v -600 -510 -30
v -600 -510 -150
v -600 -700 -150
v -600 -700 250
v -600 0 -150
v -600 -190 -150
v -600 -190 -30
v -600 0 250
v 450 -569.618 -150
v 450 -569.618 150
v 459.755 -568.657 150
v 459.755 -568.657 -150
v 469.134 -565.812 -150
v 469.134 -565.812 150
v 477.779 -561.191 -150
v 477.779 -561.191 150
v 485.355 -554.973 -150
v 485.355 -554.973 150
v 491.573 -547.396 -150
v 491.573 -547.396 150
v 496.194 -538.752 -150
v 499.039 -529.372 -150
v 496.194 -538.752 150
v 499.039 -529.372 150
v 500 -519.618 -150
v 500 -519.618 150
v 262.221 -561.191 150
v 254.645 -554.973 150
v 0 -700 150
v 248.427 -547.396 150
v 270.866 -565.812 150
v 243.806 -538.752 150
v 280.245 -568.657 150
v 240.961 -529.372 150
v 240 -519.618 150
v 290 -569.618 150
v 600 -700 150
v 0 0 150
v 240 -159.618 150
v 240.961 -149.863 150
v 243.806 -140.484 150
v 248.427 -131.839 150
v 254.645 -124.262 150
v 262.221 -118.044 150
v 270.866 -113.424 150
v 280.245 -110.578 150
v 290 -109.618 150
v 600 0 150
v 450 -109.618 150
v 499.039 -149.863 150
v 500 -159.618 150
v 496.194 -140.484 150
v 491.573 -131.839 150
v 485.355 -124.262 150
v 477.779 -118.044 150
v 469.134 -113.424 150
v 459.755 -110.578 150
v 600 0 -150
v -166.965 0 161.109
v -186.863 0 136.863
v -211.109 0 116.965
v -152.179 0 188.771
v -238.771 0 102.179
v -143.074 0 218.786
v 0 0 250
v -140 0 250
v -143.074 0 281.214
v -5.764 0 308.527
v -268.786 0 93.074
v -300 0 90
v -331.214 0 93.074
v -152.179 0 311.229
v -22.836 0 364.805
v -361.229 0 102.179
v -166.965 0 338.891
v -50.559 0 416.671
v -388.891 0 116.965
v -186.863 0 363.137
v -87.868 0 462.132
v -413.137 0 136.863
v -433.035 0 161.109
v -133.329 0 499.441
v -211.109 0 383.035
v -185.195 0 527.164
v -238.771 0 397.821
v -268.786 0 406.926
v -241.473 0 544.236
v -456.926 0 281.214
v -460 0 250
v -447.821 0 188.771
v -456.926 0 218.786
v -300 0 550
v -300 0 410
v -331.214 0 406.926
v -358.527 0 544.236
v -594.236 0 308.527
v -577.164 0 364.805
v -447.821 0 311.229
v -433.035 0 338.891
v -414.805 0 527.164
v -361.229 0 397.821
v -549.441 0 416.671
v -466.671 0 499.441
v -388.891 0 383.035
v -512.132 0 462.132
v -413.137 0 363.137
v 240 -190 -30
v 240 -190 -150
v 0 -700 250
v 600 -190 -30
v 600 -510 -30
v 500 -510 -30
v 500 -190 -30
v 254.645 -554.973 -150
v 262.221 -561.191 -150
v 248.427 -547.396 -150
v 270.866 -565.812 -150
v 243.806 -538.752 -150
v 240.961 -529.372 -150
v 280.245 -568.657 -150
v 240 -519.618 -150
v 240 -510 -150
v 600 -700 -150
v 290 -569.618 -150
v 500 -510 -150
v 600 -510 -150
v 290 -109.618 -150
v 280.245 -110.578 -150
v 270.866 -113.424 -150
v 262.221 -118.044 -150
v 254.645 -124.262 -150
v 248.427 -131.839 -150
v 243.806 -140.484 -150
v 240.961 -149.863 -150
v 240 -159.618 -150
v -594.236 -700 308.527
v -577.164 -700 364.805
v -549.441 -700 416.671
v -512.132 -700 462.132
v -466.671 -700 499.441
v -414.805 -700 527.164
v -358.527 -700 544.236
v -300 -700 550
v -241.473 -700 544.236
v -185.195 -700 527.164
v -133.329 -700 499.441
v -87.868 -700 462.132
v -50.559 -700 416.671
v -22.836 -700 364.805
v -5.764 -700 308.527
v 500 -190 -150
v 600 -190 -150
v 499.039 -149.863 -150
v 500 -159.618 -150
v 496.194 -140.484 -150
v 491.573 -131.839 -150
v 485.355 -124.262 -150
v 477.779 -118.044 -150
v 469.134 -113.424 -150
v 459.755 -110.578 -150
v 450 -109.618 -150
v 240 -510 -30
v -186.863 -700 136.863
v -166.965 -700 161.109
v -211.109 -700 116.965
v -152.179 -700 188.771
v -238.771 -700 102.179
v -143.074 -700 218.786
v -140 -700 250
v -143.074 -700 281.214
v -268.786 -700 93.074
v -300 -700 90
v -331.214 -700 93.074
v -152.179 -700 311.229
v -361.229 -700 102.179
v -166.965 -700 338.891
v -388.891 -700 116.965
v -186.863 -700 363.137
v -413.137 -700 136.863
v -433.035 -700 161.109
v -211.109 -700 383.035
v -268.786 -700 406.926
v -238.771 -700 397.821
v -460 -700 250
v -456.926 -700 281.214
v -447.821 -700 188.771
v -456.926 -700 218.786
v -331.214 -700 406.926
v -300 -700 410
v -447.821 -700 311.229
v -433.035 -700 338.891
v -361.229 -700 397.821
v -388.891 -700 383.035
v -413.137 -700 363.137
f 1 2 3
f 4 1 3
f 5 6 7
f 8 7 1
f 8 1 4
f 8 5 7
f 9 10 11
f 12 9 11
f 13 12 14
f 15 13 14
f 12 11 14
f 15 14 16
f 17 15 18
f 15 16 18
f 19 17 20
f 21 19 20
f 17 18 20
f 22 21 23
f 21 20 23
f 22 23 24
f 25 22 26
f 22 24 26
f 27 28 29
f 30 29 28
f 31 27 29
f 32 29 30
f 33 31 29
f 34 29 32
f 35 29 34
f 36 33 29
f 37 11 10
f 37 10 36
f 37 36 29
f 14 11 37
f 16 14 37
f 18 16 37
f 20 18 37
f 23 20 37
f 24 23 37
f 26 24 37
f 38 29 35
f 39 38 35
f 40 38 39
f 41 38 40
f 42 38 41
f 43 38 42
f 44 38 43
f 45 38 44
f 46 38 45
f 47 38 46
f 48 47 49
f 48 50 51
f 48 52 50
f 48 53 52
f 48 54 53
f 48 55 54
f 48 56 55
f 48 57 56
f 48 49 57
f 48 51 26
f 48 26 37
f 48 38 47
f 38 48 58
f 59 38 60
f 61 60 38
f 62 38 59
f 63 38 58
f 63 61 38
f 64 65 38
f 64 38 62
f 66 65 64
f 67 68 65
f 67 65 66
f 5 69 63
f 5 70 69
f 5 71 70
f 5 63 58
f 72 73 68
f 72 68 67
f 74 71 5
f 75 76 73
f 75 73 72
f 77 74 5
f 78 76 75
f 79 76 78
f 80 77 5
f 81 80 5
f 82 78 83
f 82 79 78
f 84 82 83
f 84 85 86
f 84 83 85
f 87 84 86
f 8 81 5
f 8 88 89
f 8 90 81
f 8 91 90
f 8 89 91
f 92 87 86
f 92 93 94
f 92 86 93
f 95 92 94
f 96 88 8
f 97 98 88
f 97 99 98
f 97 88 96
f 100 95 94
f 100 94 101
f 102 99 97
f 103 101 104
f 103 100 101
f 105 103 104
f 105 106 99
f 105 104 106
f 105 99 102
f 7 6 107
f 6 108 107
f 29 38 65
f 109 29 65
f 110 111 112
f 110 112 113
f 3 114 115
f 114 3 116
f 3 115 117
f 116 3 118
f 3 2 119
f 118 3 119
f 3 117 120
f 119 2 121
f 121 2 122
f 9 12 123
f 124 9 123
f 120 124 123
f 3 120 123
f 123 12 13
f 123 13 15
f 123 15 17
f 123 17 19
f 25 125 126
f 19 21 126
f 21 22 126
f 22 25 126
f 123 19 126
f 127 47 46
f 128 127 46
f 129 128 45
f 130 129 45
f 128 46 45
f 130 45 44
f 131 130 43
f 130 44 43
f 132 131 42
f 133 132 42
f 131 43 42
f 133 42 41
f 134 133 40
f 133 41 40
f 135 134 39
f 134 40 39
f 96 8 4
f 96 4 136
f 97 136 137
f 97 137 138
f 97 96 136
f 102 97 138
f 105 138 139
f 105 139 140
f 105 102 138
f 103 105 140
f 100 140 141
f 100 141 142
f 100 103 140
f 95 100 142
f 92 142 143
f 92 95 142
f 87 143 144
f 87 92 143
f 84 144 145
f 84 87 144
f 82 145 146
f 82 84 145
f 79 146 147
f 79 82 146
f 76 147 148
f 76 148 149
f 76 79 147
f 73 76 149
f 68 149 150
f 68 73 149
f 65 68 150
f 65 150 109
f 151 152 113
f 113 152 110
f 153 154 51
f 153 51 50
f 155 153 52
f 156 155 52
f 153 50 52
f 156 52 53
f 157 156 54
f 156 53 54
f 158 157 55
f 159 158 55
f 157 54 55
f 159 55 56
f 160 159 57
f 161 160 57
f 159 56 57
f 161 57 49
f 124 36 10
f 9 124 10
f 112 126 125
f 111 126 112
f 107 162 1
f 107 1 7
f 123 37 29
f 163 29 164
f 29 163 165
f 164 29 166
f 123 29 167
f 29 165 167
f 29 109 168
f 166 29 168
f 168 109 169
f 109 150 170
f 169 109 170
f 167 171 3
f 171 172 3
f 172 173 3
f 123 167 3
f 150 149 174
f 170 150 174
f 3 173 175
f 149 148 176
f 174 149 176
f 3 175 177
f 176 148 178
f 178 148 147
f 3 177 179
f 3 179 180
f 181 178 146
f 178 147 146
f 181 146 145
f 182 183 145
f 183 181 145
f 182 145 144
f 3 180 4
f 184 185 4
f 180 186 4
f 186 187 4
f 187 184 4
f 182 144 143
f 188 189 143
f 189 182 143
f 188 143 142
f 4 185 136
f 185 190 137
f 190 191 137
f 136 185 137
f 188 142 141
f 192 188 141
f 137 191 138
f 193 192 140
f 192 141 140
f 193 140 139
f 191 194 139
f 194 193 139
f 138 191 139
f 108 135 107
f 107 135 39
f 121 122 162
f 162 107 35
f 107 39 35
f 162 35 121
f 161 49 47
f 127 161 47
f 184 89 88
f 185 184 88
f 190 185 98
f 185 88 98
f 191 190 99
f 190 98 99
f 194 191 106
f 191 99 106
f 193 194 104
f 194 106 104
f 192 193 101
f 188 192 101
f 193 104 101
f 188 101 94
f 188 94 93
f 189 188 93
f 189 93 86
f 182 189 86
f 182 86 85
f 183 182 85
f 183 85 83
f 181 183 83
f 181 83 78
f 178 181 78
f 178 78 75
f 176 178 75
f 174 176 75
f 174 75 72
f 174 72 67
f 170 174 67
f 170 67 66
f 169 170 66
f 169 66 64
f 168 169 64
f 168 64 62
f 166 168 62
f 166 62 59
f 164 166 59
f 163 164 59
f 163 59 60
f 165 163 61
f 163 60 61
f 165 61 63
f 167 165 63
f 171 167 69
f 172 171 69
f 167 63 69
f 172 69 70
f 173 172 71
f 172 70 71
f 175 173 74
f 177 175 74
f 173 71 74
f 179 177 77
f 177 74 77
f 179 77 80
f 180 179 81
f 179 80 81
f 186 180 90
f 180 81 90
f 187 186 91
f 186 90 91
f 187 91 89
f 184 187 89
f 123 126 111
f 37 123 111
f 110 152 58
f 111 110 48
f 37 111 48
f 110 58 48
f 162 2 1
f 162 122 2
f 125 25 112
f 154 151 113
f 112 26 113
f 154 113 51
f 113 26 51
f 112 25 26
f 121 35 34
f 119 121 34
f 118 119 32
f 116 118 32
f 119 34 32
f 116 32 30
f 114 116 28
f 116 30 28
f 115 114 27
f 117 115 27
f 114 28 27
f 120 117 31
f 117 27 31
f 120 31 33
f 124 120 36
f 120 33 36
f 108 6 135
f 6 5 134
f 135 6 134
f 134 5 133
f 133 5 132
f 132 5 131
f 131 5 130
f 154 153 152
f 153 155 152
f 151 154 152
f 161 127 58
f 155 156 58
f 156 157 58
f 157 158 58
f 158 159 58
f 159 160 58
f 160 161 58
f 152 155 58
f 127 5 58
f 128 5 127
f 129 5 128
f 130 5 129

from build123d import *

# Parameters (mm, degrees)
F0_W     = 1200
F0_H     = 300
F1_DEPTH = 700
F2_W     = 600
F2_H     = 100
F3_DEPTH = 700
F4_R     = 160
F5_DEPTH = 700.001
F7_DEPTH = 300.001
F8_W     = 320
F8_H     = 240
F9_DEPTH = 1200.001


with BuildPart() as f1:
    # F0 (on Front) → F1 (new body)
    with BuildSketch(Plane.XZ):
        Rectangle(F0_W, F0_H)
    extrude(amount=F1_DEPTH)

    # F2 (on face) → F3 (join)
    with BuildSketch(Plane(origin=(0, 0, 0), x_dir=(-1, 0, 0), z_dir=(0, 1, 0))):
        with Locations((300, 200)):
            Rectangle(F2_W, F2_H)
        with BuildLine():
            Line((0, 250), (600, 250))
            ThreePointArc((600, 250), (300, 550), (0, 250))
        make_face()
    extrude(amount=-F3_DEPTH)

    # F4 (on face) → F5 (cut, through all)
    with BuildSketch(Plane(origin=(0, 0, 0), x_dir=(-1, 0, 0), z_dir=(0, 1, 0))):
        with Locations((300, 250)):
            Circle(F4_R)
    extrude(amount=-F5_DEPTH, mode=Mode.SUBTRACT)

    # F6 (on face) → F7 (cut, through all)
    with BuildSketch(Plane.XY.offset(150)):
        with BuildLine():
            Line((450, -109.617759), (290, -109.617759))
            ThreePointArc((290, -109.617759), (254.644661, -124.26242), (240, -159.617759))
            Line((240, -159.617759), (240, -519.617759))
            ThreePointArc((240, -519.617759), (254.644661, -554.973098), (290, -569.617759))
            Line((290, -569.617759), (450, -569.617759))
            ThreePointArc((450, -569.617759), (485.355339, -554.973098), (500, -519.617759))
            Line((500, -519.617759), (500, -159.617759))
            ThreePointArc((500, -159.617759), (485.355339, -124.26242), (450, -109.617759))
        make_face()
    extrude(amount=-F7_DEPTH, mode=Mode.SUBTRACT)

    # F8 (on face) → F9 (cut, through all)
    with BuildSketch(Plane.YZ.offset(600)):
        with Locations((-350, -150)):
            Rectangle(F8_W, F8_H)
    extrude(amount=-F9_DEPTH, mode=Mode.SUBTRACT)


solid = f1.part
